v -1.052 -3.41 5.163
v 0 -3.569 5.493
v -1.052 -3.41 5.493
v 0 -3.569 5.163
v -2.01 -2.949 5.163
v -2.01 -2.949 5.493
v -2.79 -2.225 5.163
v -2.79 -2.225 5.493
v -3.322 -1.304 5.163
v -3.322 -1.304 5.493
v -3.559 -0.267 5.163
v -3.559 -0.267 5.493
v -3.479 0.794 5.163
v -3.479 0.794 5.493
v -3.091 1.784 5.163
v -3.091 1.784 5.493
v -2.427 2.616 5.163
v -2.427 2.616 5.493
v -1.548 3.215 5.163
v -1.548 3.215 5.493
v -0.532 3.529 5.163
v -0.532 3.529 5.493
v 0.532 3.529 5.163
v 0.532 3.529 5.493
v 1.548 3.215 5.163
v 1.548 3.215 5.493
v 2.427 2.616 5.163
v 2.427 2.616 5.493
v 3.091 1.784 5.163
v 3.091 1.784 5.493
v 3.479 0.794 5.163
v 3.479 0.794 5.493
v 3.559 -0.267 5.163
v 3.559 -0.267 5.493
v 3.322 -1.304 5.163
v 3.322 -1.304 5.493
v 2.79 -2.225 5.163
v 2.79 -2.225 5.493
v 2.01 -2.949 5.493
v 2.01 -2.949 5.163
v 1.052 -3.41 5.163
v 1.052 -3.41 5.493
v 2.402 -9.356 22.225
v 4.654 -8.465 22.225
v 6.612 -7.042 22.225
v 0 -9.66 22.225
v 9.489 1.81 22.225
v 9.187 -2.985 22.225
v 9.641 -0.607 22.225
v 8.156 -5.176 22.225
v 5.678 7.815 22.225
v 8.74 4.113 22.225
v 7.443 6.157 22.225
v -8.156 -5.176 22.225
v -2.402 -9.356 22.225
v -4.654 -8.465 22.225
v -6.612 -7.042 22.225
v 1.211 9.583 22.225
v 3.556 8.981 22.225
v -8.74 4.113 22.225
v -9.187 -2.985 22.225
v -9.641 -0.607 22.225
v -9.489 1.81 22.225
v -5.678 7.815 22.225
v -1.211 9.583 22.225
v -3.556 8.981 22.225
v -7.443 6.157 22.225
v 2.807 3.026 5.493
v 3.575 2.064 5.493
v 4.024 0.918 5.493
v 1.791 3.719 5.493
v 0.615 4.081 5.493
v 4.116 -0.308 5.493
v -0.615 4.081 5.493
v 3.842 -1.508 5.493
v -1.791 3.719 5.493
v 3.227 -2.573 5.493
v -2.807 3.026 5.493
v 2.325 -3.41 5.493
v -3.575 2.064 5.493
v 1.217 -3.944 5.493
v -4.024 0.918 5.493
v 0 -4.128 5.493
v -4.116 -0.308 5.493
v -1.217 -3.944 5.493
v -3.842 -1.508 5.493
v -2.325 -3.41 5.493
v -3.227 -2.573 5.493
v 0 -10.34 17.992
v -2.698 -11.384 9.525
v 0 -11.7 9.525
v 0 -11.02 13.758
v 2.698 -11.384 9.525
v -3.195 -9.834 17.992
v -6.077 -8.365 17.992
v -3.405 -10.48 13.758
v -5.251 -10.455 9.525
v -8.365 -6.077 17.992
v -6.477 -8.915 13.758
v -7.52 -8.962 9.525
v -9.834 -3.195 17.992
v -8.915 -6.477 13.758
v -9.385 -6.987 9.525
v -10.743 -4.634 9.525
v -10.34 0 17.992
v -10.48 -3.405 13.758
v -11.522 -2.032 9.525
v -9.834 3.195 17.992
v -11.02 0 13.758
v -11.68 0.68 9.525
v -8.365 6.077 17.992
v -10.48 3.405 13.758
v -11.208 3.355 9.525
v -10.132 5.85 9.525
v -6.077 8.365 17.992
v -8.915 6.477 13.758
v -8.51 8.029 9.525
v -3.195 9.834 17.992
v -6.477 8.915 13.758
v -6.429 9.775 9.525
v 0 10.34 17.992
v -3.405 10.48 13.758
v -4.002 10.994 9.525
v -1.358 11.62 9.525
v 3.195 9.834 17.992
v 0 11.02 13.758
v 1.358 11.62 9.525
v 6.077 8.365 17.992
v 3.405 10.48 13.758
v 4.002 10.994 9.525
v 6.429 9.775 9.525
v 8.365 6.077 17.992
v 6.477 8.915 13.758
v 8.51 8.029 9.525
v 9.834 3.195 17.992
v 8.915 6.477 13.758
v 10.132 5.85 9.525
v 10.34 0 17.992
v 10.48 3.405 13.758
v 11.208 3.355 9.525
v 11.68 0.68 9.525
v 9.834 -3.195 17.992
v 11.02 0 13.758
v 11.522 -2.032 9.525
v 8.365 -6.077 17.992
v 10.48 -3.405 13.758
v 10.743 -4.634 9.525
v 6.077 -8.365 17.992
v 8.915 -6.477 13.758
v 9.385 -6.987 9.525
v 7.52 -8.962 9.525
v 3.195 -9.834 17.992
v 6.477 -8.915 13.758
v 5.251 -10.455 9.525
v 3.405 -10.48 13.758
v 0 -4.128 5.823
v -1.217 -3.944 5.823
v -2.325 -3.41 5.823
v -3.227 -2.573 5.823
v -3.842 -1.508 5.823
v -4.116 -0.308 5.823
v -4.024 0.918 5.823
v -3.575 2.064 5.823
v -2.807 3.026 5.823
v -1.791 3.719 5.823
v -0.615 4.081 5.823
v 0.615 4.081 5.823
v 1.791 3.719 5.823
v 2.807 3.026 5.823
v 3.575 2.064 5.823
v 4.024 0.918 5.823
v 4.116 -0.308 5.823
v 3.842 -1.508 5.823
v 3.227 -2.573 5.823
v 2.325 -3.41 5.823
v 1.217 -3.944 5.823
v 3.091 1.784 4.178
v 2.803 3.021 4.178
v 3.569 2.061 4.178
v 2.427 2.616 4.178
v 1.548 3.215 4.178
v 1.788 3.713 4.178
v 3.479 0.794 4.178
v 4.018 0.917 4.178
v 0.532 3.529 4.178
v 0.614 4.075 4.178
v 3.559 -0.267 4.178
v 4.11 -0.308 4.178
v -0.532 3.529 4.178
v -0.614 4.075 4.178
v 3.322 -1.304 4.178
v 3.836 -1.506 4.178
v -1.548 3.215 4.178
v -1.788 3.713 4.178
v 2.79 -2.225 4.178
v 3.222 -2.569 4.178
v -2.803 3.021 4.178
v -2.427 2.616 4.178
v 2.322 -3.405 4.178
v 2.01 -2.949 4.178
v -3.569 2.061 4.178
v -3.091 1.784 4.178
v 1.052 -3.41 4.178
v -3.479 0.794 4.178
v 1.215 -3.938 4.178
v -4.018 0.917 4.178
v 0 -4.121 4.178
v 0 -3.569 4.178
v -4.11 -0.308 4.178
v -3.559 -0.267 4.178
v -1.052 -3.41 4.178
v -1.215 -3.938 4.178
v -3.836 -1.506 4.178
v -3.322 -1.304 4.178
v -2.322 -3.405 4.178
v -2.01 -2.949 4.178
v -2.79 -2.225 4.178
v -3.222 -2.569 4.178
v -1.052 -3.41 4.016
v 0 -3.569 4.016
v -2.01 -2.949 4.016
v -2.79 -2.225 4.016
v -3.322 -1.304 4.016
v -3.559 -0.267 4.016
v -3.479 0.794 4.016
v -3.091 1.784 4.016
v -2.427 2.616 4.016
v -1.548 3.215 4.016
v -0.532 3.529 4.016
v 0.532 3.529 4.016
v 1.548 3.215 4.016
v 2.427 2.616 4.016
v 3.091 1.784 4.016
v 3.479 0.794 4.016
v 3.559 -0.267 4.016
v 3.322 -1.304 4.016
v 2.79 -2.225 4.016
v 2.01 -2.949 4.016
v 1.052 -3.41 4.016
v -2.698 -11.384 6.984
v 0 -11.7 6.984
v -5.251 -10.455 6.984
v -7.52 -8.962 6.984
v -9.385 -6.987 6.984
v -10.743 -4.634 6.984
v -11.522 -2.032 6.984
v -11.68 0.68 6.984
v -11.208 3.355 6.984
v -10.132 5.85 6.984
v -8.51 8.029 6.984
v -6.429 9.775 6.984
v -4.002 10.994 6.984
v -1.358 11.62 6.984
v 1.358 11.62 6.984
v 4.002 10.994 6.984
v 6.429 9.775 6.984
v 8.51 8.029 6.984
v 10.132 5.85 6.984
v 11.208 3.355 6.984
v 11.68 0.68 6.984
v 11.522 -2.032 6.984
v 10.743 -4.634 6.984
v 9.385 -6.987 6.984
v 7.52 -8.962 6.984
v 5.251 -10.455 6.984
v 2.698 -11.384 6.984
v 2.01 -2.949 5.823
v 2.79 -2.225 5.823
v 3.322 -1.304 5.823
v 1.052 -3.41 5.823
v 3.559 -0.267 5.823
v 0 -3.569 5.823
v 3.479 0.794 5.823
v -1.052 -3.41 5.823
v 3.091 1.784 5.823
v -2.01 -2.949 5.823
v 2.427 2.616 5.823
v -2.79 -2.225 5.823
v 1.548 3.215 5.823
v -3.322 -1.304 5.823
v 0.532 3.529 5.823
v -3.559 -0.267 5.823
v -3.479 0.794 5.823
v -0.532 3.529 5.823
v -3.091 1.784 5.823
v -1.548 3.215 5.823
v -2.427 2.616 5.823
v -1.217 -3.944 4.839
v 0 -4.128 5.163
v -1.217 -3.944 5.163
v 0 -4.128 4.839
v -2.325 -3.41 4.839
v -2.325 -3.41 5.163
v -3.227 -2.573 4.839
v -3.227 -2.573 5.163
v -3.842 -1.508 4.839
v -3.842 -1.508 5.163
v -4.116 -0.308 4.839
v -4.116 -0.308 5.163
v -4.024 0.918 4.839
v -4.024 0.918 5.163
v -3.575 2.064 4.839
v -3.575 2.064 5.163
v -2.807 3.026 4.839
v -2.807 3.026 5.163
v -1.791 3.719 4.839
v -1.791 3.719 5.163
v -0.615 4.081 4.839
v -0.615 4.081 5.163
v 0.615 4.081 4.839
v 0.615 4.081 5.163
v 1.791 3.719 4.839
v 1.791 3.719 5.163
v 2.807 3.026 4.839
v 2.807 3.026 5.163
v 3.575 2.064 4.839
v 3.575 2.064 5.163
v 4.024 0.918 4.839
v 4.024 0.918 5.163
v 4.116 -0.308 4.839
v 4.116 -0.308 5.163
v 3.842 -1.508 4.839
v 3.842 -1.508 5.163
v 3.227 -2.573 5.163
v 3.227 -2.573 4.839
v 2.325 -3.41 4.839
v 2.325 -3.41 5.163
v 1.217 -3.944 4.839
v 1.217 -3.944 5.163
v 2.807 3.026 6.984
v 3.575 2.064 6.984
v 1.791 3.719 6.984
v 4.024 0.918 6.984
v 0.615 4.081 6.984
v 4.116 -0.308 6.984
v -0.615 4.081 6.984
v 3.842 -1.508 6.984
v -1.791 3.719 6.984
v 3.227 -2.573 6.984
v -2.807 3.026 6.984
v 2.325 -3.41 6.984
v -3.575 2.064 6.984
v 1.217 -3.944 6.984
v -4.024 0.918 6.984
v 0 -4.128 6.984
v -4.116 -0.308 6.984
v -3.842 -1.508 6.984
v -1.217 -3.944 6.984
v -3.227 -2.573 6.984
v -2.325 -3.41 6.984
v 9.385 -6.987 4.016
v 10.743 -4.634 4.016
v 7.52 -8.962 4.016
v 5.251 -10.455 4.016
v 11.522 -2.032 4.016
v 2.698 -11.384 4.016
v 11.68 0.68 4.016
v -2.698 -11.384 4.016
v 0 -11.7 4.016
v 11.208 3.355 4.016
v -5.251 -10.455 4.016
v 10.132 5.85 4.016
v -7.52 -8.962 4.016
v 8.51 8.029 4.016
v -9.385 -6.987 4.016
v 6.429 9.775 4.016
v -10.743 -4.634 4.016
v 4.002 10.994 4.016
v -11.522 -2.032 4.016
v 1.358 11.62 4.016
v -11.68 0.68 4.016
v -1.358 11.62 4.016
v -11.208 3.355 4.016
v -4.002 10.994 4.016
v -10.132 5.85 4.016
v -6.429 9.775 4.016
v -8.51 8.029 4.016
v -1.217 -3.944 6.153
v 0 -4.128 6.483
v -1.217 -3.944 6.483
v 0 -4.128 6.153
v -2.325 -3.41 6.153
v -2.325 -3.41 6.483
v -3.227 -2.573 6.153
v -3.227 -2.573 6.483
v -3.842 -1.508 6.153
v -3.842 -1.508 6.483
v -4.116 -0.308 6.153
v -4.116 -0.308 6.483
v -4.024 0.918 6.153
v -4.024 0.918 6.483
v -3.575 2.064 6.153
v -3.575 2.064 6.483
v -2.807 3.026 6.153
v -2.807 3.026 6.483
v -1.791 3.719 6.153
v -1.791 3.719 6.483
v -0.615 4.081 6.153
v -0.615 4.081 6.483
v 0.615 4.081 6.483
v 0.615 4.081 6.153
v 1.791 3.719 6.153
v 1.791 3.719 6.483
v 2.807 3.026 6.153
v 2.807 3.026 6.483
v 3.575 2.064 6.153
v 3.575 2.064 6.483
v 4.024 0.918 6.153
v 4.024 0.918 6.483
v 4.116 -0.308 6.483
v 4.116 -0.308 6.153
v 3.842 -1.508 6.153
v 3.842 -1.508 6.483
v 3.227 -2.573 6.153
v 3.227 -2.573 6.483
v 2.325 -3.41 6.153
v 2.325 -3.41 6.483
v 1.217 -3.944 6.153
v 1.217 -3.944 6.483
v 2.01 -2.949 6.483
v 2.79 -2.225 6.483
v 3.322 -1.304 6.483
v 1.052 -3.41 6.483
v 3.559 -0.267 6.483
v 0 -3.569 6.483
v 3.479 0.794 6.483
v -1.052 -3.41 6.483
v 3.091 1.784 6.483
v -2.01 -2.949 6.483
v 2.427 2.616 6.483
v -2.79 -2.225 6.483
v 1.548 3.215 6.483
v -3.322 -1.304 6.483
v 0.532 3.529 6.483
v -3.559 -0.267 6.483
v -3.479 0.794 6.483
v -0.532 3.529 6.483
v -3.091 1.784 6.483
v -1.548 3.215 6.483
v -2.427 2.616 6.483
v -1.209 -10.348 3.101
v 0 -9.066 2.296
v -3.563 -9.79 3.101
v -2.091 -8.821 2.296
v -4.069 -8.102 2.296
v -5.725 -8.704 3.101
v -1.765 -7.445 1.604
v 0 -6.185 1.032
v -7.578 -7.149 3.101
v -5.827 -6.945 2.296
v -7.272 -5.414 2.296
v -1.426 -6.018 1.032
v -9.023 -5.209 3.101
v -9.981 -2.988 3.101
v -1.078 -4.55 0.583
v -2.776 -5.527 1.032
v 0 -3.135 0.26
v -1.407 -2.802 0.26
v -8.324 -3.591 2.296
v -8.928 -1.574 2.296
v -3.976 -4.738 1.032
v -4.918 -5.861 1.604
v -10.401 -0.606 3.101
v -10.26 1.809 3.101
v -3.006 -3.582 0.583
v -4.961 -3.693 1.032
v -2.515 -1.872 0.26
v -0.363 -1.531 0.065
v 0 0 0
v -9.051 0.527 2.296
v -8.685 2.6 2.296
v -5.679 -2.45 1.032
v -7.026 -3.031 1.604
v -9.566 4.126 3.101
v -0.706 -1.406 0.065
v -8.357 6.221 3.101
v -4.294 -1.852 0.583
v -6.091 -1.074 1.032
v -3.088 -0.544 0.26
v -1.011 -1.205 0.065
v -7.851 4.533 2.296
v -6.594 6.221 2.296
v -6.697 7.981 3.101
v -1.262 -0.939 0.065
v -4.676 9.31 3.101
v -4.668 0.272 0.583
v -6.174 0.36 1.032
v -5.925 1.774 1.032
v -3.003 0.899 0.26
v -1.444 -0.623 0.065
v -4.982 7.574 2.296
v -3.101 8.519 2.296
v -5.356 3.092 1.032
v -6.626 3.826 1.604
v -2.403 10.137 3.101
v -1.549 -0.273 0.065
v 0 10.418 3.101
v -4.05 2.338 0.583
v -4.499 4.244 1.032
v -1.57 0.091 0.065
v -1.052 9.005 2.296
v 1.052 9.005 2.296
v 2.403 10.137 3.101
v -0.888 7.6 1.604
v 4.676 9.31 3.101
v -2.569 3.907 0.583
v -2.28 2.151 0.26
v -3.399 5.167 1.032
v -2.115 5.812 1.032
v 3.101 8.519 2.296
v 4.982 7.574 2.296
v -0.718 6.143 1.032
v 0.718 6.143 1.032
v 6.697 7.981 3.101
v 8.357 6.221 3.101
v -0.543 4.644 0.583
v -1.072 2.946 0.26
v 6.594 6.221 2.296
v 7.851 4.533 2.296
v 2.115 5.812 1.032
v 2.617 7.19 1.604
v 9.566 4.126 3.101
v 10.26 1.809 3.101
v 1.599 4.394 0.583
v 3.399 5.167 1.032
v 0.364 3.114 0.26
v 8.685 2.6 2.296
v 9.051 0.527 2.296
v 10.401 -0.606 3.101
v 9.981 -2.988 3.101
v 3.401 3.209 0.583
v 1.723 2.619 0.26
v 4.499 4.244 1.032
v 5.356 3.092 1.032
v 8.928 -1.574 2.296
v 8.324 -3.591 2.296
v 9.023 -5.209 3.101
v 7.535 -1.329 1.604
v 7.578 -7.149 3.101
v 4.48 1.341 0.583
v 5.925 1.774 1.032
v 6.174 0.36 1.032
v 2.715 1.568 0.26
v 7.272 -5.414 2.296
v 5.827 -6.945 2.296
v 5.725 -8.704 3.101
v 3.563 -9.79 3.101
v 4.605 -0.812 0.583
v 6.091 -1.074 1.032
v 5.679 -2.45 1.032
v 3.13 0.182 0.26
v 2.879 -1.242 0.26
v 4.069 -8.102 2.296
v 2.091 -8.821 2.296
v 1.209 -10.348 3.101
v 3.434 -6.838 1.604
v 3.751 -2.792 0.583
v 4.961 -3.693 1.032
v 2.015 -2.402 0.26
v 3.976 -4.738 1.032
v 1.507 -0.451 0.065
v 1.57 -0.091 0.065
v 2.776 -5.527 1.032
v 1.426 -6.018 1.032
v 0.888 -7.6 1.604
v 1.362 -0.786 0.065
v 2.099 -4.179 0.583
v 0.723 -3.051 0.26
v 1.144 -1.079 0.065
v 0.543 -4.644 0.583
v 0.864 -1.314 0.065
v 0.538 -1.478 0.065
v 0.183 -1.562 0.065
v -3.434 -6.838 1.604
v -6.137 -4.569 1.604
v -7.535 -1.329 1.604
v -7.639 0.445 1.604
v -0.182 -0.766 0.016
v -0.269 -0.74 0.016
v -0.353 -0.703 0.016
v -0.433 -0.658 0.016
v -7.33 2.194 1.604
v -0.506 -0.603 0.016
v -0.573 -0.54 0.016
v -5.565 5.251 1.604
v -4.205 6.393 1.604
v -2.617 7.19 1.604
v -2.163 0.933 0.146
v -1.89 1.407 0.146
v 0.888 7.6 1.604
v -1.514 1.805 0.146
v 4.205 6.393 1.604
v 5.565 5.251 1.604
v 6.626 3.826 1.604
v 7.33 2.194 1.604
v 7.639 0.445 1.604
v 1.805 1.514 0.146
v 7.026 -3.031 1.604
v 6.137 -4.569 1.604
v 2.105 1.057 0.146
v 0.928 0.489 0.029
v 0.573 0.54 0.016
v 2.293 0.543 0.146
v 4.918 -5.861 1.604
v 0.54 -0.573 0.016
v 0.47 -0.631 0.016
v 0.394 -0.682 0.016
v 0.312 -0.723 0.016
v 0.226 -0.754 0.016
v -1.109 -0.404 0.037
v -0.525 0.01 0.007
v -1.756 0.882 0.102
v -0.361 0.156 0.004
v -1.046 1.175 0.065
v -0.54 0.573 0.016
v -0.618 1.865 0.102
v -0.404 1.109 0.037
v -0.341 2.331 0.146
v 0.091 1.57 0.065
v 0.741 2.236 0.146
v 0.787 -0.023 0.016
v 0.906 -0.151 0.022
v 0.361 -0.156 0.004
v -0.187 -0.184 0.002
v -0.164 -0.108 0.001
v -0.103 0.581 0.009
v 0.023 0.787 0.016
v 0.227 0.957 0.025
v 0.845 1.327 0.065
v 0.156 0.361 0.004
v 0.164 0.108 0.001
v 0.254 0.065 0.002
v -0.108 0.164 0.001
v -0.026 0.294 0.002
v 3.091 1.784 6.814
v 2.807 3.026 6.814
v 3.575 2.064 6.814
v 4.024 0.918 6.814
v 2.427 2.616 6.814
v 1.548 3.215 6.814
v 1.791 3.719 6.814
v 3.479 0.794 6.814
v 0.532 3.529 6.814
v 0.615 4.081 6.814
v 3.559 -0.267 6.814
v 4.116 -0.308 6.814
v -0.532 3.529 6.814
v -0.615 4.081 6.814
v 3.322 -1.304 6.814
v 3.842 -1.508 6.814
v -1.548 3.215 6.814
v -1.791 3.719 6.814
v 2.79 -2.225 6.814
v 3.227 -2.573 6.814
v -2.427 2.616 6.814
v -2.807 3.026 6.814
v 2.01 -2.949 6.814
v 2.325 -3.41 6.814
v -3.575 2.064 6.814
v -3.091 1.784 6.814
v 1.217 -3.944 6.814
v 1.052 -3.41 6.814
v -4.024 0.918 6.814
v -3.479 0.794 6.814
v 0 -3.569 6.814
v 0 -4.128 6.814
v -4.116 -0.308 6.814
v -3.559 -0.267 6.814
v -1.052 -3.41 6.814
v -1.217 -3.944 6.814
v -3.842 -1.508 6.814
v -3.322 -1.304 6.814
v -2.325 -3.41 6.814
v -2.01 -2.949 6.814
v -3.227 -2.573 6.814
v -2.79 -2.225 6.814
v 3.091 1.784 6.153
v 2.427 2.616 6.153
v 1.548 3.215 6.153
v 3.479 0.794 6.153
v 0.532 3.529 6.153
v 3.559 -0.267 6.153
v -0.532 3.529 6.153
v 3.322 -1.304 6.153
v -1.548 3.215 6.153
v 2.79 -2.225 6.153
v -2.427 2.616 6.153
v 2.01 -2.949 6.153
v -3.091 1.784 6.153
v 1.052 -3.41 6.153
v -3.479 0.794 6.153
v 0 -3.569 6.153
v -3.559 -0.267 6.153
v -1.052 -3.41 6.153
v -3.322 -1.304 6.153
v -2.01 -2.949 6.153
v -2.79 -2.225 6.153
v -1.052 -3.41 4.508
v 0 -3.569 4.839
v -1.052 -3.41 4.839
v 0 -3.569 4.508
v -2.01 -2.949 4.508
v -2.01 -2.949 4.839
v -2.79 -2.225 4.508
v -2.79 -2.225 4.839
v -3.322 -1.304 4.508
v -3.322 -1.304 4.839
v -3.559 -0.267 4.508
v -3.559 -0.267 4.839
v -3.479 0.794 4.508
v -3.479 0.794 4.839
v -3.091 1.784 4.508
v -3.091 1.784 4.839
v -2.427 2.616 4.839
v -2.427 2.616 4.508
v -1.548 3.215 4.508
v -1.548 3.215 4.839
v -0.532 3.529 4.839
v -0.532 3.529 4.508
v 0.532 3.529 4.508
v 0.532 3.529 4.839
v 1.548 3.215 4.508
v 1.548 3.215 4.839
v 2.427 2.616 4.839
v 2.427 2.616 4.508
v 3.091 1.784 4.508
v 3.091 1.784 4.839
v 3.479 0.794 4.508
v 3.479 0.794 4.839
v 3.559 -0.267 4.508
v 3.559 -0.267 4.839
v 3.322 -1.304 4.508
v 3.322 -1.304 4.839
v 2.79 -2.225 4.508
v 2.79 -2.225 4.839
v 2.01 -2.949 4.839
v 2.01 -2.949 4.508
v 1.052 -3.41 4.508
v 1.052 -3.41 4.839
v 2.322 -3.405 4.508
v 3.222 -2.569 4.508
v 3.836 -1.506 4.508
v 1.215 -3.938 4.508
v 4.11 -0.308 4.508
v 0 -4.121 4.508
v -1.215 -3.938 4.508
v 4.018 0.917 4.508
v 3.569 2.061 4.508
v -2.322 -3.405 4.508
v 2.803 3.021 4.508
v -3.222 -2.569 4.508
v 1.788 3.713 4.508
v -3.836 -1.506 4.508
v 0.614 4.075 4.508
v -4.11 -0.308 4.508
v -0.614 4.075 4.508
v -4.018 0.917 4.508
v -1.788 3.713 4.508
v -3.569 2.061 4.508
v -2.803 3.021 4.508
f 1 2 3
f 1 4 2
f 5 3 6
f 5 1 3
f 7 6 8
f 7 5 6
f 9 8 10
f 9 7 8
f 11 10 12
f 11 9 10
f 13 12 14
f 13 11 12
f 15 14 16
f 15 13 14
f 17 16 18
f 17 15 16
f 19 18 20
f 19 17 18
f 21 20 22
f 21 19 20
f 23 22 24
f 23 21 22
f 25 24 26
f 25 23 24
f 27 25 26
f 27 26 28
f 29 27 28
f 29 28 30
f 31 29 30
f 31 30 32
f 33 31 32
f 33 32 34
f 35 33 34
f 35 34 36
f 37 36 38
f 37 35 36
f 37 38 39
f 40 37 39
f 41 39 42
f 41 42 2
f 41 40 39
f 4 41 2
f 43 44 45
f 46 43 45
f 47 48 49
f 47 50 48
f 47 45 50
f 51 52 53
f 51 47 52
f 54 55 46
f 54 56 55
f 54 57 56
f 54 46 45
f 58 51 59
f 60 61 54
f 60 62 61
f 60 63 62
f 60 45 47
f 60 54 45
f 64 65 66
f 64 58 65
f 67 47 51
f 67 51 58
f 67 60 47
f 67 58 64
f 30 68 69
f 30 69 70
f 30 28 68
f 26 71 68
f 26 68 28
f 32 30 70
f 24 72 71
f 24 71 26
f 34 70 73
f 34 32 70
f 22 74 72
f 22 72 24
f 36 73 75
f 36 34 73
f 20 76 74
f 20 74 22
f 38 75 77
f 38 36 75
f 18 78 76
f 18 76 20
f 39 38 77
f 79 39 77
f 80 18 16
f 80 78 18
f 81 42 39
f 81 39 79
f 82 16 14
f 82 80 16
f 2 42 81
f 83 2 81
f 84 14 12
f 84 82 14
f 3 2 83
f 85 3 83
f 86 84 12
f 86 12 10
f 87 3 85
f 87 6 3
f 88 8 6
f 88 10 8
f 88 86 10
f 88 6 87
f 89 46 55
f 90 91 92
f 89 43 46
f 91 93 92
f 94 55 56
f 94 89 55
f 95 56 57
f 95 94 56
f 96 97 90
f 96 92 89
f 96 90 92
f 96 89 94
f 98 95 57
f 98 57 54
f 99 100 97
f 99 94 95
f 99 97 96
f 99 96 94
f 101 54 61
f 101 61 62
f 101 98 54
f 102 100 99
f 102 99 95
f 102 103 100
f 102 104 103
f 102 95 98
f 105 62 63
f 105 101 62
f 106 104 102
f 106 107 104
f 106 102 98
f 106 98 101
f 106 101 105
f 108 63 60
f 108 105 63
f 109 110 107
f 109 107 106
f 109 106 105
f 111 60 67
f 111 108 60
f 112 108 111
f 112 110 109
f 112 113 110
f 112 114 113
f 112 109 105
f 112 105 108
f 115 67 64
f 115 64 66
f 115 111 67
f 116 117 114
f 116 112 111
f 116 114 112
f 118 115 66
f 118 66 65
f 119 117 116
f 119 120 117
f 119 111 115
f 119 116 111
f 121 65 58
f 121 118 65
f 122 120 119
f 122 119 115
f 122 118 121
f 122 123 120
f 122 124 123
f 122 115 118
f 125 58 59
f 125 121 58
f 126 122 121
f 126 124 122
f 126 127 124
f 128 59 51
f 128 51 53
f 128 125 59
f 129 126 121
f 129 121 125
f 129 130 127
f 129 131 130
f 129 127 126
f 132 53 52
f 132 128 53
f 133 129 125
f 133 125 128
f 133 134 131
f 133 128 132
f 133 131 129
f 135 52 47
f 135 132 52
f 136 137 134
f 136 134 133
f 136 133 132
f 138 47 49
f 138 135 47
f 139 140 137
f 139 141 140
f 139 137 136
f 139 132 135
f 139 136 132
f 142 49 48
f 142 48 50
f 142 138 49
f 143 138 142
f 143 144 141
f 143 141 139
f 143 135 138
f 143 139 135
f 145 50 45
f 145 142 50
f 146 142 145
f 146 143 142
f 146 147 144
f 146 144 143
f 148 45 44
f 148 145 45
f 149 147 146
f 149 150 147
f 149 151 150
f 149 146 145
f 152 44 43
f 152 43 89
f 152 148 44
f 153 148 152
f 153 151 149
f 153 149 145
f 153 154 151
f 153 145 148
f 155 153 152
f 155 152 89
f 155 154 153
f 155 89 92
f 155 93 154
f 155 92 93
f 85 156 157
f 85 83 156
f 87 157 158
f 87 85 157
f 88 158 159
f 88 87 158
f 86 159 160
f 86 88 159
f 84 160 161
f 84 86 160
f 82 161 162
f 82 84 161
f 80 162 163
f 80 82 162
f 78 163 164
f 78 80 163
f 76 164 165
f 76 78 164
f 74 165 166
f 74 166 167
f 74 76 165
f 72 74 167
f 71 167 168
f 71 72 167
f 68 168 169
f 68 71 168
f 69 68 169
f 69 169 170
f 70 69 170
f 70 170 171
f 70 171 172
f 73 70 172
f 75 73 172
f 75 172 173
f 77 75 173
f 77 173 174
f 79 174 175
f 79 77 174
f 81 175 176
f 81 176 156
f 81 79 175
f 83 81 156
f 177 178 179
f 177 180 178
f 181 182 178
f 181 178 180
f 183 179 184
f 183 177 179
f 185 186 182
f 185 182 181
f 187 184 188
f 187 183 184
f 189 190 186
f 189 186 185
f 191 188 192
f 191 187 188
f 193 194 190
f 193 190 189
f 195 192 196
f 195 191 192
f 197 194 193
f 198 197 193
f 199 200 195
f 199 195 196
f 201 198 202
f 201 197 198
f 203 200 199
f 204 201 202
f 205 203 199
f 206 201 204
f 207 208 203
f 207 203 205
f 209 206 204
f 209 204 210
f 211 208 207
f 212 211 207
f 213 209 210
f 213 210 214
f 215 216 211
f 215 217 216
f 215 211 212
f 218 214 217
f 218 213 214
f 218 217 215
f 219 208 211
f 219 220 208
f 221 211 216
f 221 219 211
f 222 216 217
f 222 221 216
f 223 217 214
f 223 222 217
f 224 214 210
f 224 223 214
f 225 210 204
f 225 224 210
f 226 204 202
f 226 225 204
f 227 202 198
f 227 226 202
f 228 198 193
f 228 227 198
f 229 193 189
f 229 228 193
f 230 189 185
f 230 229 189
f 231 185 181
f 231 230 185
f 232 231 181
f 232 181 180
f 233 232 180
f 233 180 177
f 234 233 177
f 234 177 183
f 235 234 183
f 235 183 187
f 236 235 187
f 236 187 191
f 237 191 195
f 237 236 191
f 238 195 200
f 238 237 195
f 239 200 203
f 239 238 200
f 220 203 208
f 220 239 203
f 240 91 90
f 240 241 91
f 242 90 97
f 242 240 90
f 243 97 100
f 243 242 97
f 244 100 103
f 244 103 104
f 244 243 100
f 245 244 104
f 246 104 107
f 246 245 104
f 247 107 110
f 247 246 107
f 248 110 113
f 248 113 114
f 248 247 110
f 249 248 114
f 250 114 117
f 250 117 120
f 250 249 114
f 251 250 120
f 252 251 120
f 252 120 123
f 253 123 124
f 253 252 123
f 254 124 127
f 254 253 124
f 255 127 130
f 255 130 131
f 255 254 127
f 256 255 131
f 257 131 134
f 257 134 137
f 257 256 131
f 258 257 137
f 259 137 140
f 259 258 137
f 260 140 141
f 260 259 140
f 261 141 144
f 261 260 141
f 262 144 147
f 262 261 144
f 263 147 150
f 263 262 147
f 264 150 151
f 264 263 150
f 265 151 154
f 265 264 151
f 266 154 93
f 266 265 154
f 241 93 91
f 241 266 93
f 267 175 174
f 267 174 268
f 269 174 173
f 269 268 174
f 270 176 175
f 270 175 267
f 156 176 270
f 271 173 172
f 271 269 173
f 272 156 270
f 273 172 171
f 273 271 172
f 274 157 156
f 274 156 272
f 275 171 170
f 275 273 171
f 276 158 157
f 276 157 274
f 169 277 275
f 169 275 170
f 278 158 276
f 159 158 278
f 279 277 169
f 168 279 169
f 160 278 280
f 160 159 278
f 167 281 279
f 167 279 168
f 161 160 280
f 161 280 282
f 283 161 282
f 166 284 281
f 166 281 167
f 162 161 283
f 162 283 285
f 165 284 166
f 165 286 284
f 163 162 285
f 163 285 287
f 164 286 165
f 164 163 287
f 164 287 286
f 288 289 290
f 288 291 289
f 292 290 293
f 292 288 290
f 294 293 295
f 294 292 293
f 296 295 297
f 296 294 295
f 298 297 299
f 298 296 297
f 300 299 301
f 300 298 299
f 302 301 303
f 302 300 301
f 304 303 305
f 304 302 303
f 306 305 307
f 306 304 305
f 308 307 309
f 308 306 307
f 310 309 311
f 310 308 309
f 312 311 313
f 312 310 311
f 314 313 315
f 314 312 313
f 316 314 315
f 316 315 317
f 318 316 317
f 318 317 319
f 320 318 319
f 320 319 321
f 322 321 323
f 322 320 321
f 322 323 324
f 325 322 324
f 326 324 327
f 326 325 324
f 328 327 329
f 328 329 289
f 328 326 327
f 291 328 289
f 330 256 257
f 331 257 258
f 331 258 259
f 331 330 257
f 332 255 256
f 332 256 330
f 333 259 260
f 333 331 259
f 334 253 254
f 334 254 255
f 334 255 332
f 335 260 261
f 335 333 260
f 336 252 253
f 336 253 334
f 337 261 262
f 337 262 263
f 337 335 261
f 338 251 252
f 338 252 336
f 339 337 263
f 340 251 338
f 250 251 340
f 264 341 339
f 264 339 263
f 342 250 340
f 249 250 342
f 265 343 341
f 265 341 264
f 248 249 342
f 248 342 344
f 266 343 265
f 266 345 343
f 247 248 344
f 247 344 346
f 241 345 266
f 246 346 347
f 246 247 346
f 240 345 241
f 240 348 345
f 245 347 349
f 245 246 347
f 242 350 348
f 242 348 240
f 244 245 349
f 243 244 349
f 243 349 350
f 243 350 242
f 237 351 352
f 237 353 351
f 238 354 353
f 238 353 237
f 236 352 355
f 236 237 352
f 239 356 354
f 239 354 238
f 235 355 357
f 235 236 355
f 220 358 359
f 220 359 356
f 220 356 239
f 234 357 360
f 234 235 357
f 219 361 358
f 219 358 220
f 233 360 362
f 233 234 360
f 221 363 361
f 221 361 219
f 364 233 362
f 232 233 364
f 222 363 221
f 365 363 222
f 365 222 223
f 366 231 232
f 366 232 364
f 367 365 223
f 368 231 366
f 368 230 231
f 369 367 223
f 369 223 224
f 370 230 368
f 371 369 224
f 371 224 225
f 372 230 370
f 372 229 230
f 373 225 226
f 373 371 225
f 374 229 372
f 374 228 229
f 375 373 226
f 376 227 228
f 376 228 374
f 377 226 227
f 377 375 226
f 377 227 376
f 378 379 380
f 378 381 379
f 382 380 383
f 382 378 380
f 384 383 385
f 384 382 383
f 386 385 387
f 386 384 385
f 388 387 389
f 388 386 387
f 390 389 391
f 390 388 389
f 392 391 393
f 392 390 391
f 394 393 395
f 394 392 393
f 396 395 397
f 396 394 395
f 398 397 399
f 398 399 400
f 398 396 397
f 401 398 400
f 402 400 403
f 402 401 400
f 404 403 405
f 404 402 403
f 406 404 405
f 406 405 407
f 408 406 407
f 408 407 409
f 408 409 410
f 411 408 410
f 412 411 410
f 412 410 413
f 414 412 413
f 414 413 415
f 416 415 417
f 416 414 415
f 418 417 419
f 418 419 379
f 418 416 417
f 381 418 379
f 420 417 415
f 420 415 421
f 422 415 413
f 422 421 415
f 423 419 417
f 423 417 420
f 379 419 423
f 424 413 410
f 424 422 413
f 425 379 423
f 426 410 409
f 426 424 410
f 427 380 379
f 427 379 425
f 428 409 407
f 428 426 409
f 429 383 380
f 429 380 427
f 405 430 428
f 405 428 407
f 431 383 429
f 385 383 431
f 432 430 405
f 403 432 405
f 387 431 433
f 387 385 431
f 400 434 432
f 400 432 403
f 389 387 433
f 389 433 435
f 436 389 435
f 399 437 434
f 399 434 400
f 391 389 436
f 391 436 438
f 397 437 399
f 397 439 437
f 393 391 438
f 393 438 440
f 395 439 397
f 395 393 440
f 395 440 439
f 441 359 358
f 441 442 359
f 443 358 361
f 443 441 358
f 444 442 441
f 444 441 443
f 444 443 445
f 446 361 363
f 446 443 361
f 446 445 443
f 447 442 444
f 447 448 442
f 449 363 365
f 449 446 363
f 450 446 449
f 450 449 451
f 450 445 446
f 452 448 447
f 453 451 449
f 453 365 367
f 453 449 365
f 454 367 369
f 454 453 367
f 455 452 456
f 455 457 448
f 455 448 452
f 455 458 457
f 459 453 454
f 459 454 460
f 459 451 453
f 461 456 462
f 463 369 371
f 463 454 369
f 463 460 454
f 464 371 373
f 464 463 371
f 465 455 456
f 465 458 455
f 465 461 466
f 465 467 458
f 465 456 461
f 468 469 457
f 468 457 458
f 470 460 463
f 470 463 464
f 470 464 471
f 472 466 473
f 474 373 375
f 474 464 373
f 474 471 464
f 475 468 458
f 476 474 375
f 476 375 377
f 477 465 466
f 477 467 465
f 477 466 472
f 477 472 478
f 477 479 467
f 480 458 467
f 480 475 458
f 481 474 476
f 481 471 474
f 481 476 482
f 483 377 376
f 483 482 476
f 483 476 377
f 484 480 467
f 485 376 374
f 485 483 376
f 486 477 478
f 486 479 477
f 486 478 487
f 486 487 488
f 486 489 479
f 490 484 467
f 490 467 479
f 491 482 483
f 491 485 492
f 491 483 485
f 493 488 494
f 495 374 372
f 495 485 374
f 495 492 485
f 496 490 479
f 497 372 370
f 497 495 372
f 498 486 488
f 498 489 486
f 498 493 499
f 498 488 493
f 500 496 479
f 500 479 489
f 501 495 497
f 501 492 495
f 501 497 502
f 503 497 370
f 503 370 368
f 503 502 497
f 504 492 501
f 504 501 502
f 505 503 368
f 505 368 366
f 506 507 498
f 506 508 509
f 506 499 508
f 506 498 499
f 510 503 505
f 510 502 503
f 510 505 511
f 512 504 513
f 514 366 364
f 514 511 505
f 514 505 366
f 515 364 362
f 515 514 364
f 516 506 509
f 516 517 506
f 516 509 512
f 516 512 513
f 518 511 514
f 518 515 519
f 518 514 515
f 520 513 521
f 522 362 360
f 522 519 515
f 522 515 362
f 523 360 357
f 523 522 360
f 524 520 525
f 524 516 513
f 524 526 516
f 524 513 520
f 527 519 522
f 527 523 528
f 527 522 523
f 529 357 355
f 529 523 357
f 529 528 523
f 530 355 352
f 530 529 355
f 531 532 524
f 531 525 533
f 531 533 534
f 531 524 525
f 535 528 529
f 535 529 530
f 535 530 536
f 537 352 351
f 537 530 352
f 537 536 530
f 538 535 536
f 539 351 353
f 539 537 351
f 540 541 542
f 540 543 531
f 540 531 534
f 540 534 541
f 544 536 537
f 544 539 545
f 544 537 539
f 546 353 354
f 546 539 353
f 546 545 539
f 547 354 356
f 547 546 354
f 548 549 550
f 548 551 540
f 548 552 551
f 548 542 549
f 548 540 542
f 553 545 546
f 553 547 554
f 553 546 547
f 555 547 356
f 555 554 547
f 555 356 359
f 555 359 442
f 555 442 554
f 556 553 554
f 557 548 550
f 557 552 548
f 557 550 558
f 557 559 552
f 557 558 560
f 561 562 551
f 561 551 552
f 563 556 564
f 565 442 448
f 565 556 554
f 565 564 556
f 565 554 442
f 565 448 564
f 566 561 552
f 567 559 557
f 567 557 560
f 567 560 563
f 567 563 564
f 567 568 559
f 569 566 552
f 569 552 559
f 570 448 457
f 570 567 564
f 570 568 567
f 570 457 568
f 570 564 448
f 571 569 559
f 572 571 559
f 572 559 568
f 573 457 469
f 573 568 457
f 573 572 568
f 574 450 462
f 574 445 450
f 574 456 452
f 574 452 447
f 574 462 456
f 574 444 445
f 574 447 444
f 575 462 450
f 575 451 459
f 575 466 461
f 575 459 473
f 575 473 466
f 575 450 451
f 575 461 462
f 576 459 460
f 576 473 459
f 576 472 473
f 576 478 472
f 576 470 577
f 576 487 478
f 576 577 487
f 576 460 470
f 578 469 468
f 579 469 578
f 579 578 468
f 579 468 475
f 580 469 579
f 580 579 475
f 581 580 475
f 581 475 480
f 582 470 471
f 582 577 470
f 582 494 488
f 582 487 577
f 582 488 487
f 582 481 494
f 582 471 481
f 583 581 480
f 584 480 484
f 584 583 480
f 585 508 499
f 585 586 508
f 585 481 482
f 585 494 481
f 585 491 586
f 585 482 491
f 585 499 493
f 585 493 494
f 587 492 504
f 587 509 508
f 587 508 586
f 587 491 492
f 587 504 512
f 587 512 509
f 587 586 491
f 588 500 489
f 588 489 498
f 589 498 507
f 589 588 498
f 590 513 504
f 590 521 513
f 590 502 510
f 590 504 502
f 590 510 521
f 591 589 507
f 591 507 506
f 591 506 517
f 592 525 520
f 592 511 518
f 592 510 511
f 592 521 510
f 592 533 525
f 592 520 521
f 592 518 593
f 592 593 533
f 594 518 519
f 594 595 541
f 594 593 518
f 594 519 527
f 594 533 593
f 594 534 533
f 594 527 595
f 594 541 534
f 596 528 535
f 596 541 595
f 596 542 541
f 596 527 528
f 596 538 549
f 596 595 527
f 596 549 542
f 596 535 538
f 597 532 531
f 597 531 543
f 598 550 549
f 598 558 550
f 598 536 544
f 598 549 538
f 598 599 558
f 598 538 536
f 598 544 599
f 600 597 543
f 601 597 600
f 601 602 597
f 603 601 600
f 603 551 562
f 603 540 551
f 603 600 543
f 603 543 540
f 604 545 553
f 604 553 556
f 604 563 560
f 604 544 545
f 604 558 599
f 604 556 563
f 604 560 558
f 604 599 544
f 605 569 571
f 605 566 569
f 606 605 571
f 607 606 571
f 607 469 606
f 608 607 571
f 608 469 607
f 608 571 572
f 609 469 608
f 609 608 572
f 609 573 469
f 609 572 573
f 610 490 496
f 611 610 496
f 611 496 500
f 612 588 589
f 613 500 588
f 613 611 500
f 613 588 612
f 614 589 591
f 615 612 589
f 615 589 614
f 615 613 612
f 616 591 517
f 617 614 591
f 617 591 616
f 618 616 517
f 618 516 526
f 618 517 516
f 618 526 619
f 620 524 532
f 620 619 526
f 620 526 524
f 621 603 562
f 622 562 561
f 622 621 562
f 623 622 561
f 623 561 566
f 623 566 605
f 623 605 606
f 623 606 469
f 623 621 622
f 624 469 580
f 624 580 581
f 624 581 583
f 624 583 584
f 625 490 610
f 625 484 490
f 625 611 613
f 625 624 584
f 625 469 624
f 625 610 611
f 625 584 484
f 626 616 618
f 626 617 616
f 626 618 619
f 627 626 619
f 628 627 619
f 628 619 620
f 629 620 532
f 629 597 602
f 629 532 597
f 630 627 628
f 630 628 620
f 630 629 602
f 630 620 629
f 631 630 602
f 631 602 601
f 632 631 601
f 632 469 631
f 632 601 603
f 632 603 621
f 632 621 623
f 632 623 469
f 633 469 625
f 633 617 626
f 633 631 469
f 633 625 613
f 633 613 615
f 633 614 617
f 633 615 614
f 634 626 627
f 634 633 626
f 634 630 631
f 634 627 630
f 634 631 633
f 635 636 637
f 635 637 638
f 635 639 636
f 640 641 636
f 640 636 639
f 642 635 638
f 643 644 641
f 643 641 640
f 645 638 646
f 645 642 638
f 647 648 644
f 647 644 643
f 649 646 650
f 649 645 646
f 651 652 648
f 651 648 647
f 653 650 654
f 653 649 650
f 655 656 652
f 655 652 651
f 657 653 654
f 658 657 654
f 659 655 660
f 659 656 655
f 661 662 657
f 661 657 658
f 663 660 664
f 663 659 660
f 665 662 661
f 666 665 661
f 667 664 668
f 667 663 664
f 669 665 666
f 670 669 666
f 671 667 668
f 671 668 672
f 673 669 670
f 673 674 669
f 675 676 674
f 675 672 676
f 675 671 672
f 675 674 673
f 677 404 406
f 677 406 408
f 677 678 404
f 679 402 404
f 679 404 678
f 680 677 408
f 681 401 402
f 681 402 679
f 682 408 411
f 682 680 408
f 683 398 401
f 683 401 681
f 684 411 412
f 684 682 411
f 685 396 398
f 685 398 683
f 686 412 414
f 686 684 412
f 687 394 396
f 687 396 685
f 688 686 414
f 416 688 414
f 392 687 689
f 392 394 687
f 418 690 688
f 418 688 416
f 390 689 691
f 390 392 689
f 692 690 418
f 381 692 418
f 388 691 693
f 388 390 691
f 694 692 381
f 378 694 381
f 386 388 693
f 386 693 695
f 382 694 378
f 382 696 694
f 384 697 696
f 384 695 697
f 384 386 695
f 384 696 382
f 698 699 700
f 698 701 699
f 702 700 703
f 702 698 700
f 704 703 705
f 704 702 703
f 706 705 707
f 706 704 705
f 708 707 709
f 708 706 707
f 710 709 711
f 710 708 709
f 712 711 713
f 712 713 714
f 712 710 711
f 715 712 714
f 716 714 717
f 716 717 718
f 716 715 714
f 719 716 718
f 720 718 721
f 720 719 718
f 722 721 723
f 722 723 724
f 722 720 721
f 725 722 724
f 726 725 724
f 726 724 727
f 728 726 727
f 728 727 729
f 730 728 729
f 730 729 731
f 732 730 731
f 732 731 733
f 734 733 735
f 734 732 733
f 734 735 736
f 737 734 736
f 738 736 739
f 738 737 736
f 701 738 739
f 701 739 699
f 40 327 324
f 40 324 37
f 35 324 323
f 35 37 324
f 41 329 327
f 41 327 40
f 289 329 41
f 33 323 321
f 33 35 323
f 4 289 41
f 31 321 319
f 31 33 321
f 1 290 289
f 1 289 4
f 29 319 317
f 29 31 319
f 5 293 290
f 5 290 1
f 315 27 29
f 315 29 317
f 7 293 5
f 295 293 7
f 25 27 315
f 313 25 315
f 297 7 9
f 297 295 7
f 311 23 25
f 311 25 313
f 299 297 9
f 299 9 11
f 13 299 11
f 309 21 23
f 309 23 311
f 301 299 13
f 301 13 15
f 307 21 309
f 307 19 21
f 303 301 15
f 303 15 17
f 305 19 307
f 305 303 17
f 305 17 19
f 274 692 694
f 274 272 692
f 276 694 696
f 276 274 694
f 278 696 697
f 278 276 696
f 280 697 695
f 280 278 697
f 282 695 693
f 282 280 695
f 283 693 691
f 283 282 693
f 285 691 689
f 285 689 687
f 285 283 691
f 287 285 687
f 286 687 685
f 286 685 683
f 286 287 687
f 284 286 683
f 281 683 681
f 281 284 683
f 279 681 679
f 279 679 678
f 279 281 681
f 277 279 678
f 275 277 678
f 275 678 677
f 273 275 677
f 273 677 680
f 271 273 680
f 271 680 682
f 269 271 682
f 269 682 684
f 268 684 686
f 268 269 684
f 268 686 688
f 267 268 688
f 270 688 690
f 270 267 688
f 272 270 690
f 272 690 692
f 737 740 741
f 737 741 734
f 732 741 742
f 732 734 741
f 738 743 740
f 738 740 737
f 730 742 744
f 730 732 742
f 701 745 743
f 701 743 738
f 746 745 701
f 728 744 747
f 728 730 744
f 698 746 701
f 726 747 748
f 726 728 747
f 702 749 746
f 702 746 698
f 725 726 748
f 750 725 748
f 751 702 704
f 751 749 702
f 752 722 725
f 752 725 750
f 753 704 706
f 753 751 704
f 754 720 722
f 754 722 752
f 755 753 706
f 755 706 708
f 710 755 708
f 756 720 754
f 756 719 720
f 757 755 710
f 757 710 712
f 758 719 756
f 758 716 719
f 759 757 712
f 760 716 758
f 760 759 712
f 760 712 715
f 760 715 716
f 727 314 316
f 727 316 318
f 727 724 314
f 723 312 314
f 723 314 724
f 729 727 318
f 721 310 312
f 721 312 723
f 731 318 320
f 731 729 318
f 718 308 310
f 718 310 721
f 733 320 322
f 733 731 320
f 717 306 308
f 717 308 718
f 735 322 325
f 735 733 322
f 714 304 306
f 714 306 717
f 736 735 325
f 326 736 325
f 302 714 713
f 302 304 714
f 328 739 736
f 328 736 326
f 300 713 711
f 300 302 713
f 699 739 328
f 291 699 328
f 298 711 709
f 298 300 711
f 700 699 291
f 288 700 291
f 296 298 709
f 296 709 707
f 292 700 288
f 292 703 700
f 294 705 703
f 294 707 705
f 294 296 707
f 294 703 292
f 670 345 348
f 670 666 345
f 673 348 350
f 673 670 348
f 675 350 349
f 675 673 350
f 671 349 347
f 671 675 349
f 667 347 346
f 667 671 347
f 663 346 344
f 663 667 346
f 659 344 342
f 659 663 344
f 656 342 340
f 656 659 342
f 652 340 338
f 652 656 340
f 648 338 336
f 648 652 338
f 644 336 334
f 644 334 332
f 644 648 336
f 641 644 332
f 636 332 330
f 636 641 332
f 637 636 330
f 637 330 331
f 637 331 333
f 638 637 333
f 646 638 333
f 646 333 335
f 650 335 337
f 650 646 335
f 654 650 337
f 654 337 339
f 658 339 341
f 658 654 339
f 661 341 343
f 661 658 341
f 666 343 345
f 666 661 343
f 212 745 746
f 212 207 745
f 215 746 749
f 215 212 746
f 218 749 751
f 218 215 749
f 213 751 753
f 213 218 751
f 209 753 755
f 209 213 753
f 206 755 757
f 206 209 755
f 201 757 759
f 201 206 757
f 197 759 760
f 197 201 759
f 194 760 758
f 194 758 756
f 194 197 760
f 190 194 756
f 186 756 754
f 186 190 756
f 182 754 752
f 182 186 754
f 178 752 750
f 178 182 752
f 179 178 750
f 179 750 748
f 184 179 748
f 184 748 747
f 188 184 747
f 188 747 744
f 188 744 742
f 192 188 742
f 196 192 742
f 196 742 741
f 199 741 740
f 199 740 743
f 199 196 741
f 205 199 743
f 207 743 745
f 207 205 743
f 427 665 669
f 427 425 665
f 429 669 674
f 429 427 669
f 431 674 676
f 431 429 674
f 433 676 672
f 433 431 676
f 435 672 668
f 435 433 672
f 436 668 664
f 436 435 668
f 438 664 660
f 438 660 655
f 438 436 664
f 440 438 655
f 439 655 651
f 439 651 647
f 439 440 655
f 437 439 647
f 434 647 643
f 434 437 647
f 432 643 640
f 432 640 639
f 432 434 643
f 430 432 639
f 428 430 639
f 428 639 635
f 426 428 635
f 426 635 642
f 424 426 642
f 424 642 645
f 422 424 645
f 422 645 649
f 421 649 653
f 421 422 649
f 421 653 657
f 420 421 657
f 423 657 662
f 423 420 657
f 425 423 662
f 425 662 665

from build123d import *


with BuildPart() as f1:
    # F0 (on Right) → F1 (revolve)
    with BuildSketch(Plane.YZ):
        with BuildLine():
            ThreePointArc((-11.699607, 4.015982), (-6.184838, 1.031946), (0, 0))
            Line((0, 0), (0, 4.7625))
            Line((0, 4.7625), (0, 9.525))
            Line((0, 9.525), (0, 19.05))
            Line((0, 19.05), (0, 22.225))
            Line((0, 22.225), (-9.659656, 22.225))
            Line((-9.659656, 22.225), (-11.699607, 9.525))
            Line((-11.699607, 9.525), (-11.699607, 6.984011))
            Line((-11.699607, 6.984011), (-4.127539, 6.984011))
            Line((-4.127539, 6.984011), (-4.127539, 6.81355))
            Line((-4.127539, 6.81355), (-3.568739, 6.81355))
            Line((-3.568739, 6.81355), (-3.568739, 6.48335))
            Line((-3.568739, 6.48335), (-4.127539, 6.48335))
            Line((-4.127539, 6.48335), (-4.127539, 6.15315))
            Line((-4.127539, 6.15315), (-3.568739, 6.15315))
            Line((-3.568739, 6.15315), (-3.568739, 5.82295))
            Line((-3.568739, 5.82295), (-4.127539, 5.82295))
            Line((-4.127539, 5.82295), (-4.127539, 5.49275))
            Line((-4.127539, 5.49275), (-3.568739, 5.49275))
            Line((-3.568739, 5.49275), (-3.568739, 5.16255))
            Line((-3.568739, 5.16255), (-4.127539, 5.16255))
            Line((-4.127539, 5.16255), (-4.127539, 4.8387))
            Line((-4.127539, 4.8387), (-3.568739, 4.8387))
            Line((-3.568739, 4.8387), (-3.568739, 4.5085))
            Line((-3.568739, 4.5085), (-4.121154, 4.5085))
            Line((-4.121154, 4.5085), (-4.121154, 4.1783))
            Line((-4.121154, 4.1783), (-3.568739, 4.1783))
            Line((-3.568739, 4.1783), (-3.568739, 4.015982))
            Line((-3.568739, 4.015982), (-11.699607, 4.015982))
        make_face()
    revolve(axis=Axis((0, 0, 11.1125), (0, 0, -1)))


solid = f1.part
